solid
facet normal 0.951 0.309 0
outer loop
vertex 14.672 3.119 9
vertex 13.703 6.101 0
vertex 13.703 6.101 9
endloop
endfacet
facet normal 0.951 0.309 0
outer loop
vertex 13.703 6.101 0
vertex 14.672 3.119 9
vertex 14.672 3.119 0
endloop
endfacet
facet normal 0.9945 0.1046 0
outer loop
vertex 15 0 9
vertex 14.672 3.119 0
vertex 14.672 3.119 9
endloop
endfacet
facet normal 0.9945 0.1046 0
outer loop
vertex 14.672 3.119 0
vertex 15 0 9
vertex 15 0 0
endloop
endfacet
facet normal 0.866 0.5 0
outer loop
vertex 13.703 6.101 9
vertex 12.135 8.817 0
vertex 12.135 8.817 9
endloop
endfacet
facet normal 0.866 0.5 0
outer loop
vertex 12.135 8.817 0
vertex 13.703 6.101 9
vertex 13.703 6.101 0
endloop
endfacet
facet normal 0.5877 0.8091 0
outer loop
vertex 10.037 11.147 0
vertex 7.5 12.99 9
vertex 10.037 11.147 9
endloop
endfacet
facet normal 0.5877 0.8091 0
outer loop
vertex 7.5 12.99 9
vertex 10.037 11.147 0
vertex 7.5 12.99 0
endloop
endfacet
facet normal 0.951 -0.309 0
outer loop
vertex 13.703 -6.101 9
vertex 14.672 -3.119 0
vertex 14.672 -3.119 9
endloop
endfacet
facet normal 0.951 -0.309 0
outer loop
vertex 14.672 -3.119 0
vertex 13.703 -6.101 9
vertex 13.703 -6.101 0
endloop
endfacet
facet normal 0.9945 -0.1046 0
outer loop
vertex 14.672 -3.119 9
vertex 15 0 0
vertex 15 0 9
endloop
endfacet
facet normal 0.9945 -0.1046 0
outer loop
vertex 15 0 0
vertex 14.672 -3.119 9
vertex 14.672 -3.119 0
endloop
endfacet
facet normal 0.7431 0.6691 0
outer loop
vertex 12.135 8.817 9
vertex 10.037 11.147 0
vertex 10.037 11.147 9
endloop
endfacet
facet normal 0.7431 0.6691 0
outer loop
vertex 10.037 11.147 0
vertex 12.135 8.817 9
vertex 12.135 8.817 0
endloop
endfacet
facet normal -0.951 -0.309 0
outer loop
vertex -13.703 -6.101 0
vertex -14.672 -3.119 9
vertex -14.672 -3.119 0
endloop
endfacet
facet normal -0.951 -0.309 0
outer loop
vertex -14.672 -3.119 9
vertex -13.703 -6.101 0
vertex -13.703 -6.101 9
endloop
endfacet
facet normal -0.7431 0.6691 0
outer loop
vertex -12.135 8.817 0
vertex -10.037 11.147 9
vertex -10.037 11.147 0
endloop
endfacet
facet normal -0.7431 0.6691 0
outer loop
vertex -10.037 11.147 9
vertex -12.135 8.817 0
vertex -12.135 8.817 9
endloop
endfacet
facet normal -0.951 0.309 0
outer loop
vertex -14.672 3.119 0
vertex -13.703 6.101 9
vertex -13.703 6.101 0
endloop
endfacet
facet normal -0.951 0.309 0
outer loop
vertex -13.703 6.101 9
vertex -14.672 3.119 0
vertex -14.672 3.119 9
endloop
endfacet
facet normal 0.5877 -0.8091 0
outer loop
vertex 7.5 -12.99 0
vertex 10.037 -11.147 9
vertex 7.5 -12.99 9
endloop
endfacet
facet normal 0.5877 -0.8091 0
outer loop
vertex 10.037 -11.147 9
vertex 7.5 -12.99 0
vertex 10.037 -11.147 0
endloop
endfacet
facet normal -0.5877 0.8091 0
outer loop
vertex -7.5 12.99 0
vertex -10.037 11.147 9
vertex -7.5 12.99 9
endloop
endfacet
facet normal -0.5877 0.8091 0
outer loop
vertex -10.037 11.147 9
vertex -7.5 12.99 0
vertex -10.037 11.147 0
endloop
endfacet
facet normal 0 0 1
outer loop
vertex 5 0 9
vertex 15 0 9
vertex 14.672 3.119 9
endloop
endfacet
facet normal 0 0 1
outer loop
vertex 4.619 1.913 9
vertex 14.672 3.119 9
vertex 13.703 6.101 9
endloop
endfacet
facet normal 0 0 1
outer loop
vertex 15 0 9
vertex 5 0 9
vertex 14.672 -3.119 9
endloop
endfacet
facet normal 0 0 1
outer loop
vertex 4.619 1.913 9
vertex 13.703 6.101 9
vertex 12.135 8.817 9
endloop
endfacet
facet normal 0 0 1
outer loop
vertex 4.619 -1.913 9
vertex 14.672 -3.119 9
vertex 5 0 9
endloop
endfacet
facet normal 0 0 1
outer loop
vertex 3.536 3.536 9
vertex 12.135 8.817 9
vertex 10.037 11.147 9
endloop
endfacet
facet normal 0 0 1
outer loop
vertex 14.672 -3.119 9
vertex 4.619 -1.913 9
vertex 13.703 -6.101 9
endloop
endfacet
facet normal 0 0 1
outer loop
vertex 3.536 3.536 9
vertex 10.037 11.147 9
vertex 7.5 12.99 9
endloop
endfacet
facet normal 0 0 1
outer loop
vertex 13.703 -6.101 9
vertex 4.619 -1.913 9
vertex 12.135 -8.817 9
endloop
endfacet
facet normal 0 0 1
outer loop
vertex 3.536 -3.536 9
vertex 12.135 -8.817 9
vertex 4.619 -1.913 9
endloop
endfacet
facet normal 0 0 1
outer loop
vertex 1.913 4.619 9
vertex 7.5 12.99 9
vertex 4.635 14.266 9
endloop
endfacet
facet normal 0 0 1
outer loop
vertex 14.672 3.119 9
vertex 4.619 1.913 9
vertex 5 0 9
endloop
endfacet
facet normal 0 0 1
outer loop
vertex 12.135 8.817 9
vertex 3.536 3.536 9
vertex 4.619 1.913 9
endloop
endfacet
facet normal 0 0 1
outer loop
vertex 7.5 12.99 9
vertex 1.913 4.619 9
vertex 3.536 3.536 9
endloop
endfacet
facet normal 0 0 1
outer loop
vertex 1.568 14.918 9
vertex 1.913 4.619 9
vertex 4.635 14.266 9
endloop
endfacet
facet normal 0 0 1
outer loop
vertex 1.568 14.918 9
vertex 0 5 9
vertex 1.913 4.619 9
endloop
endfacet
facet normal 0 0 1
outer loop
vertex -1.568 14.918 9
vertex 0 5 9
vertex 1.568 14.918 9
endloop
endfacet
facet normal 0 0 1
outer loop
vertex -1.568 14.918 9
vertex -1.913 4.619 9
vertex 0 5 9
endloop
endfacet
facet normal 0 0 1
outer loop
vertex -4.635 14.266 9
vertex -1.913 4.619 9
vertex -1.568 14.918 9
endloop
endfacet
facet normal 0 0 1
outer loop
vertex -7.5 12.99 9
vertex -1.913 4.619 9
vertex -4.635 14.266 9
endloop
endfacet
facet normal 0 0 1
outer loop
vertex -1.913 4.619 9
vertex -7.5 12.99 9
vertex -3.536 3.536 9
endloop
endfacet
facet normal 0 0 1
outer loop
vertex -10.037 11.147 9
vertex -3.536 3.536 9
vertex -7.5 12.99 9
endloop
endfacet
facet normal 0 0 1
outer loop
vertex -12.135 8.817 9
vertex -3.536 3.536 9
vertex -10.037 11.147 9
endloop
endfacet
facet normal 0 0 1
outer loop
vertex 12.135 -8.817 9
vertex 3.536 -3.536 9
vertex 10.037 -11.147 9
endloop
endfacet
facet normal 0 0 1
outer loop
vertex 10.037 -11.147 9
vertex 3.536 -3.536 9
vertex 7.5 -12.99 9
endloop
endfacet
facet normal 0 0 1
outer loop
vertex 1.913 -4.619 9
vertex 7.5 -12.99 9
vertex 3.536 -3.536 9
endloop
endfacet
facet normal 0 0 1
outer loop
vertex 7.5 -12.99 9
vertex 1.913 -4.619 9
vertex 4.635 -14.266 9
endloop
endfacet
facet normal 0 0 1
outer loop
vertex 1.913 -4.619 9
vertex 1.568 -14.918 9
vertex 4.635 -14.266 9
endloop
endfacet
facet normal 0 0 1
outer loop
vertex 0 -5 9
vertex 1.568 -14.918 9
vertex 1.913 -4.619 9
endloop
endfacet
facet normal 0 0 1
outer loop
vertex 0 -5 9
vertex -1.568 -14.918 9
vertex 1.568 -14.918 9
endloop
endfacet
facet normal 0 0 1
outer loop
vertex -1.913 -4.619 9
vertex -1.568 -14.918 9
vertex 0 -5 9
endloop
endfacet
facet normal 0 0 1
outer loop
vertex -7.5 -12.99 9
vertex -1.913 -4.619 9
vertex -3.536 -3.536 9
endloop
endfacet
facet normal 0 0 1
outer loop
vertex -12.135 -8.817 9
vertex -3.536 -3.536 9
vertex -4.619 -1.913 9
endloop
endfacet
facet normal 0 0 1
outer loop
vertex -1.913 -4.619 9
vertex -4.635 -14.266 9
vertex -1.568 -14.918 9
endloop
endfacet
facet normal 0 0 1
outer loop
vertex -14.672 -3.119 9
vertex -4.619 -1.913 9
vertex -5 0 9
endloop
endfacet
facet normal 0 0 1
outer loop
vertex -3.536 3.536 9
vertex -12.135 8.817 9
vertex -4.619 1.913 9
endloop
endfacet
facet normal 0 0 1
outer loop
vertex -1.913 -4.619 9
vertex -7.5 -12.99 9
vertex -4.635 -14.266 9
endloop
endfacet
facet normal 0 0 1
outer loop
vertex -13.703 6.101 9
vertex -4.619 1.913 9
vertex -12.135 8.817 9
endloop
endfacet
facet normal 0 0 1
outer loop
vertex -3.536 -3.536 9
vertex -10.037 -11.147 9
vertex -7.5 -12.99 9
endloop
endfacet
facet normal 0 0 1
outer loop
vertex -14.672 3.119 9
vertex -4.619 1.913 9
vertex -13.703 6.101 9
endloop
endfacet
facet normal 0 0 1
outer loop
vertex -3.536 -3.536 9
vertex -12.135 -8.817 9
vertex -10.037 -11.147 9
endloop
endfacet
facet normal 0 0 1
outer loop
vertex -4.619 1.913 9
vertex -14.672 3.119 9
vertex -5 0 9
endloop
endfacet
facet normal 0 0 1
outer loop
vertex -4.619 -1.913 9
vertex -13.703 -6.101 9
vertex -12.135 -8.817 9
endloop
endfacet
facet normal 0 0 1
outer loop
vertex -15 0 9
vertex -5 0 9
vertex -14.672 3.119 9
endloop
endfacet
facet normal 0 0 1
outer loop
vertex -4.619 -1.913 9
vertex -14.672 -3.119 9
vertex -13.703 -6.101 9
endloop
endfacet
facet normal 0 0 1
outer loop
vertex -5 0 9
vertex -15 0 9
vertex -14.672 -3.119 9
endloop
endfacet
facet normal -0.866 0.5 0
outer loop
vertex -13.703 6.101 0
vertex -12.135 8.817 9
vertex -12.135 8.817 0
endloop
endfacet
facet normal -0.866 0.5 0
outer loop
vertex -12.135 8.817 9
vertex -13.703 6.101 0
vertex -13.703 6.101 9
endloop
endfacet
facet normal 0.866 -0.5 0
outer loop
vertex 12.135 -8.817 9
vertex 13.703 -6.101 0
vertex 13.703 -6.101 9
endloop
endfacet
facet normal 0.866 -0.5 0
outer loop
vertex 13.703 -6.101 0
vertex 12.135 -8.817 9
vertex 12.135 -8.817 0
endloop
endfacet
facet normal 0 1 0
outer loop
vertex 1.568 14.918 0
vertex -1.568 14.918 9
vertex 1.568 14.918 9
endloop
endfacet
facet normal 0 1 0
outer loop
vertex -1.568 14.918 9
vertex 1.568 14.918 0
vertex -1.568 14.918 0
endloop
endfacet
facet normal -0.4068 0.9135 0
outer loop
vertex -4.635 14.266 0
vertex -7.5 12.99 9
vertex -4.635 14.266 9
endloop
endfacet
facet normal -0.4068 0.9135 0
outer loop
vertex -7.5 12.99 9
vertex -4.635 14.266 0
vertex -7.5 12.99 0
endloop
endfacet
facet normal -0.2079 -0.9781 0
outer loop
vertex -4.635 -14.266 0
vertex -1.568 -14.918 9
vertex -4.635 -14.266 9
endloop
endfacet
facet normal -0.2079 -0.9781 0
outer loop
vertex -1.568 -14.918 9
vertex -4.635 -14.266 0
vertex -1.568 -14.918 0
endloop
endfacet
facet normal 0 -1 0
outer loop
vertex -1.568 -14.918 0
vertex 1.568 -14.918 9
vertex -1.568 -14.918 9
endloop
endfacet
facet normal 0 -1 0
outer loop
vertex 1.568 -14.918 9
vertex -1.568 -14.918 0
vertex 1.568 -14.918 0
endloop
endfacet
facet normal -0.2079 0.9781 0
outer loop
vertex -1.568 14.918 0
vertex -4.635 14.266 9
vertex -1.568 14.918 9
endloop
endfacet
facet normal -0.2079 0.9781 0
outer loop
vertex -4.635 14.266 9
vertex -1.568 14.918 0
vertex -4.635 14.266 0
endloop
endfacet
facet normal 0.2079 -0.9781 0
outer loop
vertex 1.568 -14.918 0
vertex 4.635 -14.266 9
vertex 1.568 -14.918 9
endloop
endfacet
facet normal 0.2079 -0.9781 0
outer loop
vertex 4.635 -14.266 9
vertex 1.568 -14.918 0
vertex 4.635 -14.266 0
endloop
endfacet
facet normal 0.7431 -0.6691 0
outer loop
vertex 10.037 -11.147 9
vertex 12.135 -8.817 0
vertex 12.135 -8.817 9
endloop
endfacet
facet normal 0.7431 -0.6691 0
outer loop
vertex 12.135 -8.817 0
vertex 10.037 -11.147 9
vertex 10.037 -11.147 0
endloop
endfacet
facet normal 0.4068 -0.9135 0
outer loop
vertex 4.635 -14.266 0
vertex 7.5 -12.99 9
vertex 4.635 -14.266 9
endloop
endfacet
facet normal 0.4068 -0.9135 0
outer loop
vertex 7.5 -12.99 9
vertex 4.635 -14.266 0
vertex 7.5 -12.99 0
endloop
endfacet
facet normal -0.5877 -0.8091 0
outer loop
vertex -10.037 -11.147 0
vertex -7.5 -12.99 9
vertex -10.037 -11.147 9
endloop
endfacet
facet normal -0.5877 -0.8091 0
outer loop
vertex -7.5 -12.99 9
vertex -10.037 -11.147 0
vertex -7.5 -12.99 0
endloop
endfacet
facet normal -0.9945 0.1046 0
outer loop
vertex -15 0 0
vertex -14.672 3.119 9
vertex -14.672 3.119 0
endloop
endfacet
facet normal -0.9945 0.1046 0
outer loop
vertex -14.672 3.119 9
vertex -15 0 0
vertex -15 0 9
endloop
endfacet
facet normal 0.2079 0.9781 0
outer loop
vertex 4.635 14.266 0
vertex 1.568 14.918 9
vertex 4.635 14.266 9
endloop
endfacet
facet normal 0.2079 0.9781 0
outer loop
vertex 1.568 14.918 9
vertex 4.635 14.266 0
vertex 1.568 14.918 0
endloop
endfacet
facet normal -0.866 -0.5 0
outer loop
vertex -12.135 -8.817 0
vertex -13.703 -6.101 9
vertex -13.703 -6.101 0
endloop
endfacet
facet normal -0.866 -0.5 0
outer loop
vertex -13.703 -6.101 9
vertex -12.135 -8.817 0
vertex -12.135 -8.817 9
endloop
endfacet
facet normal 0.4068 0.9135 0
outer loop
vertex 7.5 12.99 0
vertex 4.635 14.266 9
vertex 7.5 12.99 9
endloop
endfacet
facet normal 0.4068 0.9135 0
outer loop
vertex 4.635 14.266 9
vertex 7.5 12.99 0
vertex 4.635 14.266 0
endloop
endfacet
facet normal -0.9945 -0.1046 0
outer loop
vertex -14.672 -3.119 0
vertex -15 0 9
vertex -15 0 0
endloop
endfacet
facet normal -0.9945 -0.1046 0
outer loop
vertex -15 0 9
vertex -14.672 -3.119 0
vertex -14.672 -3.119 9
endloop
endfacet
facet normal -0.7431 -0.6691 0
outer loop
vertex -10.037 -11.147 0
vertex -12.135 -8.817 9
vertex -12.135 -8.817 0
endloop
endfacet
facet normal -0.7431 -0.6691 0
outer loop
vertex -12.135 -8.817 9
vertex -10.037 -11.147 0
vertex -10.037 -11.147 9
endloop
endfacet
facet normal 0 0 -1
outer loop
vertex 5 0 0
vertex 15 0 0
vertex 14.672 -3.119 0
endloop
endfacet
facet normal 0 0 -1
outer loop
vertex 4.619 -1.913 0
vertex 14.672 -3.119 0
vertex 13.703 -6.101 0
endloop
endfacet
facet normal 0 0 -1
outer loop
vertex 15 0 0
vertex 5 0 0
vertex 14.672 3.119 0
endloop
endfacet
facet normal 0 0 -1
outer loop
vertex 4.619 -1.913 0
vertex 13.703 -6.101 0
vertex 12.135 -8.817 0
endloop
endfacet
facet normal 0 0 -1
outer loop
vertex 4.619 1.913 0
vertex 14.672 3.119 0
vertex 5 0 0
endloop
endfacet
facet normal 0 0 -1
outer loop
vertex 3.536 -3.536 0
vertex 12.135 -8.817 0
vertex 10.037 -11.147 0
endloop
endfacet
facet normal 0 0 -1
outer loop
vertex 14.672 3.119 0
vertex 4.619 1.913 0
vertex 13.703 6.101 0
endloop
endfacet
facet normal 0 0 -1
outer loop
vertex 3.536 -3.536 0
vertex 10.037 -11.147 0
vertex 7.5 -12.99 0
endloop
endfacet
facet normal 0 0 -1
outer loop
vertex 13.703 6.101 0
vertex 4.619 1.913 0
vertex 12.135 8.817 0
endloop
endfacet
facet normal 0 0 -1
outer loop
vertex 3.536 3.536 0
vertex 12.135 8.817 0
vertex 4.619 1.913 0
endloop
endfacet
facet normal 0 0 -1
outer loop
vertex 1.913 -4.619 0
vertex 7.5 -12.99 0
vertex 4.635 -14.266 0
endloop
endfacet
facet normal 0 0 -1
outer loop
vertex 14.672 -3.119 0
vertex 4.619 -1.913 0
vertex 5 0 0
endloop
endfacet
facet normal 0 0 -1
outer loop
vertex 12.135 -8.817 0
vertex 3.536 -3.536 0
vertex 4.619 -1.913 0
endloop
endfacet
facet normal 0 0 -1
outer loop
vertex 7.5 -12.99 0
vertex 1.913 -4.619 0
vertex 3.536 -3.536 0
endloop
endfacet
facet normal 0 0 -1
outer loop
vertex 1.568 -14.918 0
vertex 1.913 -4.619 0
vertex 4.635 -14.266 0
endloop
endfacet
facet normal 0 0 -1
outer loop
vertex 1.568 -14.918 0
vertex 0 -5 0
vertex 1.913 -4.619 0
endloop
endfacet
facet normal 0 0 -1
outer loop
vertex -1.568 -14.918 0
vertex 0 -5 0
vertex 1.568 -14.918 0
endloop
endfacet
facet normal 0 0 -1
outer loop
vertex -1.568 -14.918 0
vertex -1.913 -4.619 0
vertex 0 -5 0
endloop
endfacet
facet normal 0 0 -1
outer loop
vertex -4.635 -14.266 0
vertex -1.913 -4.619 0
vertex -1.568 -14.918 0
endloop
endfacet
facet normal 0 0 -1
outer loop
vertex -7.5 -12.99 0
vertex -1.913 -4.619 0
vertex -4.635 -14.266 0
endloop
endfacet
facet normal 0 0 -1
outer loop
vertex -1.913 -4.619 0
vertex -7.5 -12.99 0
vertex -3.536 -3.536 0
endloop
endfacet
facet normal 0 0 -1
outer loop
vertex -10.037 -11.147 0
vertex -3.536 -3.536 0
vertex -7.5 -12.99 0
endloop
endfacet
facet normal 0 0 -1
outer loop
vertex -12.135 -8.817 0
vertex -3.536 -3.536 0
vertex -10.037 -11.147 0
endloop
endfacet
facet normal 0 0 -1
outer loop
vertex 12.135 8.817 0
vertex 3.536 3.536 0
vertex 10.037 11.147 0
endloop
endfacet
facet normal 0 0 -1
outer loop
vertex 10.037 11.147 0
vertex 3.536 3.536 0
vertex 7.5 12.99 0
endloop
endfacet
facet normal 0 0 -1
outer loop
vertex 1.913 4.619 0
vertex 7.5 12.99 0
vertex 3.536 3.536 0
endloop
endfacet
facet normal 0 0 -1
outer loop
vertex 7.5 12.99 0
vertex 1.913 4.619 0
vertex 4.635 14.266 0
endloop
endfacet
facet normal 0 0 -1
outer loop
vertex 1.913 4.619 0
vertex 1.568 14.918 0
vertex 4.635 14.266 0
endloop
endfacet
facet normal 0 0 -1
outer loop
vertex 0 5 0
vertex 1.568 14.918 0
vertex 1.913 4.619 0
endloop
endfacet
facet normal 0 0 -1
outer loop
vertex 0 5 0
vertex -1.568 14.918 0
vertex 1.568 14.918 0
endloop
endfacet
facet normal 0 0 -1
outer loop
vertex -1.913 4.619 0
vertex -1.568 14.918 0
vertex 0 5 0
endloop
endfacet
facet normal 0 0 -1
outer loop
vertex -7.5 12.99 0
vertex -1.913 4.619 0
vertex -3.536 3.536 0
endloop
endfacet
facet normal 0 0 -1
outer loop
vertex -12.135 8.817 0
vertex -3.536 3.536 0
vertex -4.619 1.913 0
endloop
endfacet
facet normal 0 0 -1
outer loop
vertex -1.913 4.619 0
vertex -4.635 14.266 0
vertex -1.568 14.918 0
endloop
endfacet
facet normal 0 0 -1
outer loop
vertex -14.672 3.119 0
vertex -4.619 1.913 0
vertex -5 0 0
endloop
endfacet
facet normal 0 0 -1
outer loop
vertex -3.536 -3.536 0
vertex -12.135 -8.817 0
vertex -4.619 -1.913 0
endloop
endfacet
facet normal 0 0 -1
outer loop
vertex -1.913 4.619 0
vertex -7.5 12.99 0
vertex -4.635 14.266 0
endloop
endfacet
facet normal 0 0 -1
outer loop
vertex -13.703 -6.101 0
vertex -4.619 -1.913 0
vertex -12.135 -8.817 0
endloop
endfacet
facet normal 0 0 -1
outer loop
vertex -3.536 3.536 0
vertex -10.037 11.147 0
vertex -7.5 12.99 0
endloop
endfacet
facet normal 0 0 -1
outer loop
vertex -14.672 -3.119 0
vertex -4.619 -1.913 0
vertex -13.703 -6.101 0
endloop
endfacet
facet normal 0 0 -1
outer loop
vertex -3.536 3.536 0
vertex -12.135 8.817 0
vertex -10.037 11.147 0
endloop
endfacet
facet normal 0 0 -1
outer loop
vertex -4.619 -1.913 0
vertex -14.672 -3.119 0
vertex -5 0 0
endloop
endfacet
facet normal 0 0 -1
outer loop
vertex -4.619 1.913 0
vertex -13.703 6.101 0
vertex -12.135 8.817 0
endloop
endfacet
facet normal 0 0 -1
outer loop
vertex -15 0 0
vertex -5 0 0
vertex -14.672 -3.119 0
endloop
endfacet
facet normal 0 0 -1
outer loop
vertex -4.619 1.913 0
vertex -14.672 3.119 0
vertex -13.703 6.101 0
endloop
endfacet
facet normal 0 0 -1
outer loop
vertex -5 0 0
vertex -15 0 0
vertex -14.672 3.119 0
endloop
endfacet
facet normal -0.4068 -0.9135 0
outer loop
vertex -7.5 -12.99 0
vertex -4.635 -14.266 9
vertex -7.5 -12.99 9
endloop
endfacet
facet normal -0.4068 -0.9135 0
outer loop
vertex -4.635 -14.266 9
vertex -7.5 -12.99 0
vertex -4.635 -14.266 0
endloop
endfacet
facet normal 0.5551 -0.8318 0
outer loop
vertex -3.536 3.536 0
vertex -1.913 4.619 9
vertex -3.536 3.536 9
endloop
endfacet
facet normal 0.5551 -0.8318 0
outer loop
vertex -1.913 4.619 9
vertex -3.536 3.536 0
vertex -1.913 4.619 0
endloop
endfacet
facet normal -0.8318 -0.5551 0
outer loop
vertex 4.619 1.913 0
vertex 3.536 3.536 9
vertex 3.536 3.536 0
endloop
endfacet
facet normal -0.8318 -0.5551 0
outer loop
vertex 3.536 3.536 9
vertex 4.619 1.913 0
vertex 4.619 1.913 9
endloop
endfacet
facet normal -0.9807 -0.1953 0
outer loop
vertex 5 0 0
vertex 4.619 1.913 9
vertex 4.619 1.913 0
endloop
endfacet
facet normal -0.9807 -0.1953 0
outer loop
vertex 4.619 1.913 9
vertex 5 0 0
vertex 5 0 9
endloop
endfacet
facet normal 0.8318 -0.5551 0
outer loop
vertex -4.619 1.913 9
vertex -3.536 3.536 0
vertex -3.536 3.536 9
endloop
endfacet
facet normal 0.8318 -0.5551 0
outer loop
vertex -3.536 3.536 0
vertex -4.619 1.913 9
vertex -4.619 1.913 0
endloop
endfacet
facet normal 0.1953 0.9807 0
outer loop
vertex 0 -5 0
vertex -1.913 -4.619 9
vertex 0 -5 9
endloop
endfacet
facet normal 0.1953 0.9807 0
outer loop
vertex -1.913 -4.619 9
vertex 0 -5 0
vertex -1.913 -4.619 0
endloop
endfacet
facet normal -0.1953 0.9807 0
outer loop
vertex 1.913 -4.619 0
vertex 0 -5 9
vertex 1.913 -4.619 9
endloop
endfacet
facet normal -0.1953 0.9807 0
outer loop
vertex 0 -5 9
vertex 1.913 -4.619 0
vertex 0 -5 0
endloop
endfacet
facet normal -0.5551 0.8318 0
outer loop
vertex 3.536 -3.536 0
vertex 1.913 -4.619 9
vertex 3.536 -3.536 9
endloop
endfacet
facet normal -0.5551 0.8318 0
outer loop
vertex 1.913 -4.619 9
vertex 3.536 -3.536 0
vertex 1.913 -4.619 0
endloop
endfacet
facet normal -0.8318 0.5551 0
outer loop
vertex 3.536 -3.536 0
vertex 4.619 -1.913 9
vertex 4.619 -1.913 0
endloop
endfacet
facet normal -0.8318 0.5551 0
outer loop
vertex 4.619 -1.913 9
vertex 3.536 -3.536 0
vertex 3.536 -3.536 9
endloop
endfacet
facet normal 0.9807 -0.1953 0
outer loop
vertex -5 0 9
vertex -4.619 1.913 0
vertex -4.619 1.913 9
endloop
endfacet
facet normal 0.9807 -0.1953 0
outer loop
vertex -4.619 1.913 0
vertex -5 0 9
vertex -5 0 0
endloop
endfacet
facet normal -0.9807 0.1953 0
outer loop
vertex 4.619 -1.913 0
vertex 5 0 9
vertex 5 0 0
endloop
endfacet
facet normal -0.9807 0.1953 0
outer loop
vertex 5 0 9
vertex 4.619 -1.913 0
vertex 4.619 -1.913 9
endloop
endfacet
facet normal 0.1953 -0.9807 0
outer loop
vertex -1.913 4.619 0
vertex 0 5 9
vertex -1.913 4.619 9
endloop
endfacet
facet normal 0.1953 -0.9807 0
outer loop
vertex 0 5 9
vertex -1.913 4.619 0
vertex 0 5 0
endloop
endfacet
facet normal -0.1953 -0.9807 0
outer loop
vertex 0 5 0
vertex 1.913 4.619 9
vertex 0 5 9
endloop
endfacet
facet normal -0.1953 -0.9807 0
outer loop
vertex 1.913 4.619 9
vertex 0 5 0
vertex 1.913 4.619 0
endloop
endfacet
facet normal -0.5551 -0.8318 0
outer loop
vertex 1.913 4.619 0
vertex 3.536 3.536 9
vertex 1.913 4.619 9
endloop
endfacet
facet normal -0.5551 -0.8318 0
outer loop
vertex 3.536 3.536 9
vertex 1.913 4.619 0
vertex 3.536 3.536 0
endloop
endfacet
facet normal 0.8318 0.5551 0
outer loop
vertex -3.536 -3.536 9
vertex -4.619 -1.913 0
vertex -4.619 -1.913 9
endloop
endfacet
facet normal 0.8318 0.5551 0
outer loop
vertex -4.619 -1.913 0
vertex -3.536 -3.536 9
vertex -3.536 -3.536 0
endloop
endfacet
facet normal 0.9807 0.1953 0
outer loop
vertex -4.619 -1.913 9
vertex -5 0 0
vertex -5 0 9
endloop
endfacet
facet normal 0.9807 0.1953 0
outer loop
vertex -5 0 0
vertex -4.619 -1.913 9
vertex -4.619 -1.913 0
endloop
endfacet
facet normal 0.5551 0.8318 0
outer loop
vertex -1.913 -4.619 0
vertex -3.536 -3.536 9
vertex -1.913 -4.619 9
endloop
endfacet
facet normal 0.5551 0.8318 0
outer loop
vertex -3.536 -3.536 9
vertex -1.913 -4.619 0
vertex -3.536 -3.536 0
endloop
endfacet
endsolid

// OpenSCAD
bear_6200();

module nhf_bear(din=10,dout=30,th=9) {
    color("gray")
        difference() {
            cylinder(d=dout,h=th);
            translate([0,0,-0.5]) cylinder(d=din,h=th+1);
        }
}

module bear_6200() {
    nhf_bear(din=10,dout=30,th=9);
}
